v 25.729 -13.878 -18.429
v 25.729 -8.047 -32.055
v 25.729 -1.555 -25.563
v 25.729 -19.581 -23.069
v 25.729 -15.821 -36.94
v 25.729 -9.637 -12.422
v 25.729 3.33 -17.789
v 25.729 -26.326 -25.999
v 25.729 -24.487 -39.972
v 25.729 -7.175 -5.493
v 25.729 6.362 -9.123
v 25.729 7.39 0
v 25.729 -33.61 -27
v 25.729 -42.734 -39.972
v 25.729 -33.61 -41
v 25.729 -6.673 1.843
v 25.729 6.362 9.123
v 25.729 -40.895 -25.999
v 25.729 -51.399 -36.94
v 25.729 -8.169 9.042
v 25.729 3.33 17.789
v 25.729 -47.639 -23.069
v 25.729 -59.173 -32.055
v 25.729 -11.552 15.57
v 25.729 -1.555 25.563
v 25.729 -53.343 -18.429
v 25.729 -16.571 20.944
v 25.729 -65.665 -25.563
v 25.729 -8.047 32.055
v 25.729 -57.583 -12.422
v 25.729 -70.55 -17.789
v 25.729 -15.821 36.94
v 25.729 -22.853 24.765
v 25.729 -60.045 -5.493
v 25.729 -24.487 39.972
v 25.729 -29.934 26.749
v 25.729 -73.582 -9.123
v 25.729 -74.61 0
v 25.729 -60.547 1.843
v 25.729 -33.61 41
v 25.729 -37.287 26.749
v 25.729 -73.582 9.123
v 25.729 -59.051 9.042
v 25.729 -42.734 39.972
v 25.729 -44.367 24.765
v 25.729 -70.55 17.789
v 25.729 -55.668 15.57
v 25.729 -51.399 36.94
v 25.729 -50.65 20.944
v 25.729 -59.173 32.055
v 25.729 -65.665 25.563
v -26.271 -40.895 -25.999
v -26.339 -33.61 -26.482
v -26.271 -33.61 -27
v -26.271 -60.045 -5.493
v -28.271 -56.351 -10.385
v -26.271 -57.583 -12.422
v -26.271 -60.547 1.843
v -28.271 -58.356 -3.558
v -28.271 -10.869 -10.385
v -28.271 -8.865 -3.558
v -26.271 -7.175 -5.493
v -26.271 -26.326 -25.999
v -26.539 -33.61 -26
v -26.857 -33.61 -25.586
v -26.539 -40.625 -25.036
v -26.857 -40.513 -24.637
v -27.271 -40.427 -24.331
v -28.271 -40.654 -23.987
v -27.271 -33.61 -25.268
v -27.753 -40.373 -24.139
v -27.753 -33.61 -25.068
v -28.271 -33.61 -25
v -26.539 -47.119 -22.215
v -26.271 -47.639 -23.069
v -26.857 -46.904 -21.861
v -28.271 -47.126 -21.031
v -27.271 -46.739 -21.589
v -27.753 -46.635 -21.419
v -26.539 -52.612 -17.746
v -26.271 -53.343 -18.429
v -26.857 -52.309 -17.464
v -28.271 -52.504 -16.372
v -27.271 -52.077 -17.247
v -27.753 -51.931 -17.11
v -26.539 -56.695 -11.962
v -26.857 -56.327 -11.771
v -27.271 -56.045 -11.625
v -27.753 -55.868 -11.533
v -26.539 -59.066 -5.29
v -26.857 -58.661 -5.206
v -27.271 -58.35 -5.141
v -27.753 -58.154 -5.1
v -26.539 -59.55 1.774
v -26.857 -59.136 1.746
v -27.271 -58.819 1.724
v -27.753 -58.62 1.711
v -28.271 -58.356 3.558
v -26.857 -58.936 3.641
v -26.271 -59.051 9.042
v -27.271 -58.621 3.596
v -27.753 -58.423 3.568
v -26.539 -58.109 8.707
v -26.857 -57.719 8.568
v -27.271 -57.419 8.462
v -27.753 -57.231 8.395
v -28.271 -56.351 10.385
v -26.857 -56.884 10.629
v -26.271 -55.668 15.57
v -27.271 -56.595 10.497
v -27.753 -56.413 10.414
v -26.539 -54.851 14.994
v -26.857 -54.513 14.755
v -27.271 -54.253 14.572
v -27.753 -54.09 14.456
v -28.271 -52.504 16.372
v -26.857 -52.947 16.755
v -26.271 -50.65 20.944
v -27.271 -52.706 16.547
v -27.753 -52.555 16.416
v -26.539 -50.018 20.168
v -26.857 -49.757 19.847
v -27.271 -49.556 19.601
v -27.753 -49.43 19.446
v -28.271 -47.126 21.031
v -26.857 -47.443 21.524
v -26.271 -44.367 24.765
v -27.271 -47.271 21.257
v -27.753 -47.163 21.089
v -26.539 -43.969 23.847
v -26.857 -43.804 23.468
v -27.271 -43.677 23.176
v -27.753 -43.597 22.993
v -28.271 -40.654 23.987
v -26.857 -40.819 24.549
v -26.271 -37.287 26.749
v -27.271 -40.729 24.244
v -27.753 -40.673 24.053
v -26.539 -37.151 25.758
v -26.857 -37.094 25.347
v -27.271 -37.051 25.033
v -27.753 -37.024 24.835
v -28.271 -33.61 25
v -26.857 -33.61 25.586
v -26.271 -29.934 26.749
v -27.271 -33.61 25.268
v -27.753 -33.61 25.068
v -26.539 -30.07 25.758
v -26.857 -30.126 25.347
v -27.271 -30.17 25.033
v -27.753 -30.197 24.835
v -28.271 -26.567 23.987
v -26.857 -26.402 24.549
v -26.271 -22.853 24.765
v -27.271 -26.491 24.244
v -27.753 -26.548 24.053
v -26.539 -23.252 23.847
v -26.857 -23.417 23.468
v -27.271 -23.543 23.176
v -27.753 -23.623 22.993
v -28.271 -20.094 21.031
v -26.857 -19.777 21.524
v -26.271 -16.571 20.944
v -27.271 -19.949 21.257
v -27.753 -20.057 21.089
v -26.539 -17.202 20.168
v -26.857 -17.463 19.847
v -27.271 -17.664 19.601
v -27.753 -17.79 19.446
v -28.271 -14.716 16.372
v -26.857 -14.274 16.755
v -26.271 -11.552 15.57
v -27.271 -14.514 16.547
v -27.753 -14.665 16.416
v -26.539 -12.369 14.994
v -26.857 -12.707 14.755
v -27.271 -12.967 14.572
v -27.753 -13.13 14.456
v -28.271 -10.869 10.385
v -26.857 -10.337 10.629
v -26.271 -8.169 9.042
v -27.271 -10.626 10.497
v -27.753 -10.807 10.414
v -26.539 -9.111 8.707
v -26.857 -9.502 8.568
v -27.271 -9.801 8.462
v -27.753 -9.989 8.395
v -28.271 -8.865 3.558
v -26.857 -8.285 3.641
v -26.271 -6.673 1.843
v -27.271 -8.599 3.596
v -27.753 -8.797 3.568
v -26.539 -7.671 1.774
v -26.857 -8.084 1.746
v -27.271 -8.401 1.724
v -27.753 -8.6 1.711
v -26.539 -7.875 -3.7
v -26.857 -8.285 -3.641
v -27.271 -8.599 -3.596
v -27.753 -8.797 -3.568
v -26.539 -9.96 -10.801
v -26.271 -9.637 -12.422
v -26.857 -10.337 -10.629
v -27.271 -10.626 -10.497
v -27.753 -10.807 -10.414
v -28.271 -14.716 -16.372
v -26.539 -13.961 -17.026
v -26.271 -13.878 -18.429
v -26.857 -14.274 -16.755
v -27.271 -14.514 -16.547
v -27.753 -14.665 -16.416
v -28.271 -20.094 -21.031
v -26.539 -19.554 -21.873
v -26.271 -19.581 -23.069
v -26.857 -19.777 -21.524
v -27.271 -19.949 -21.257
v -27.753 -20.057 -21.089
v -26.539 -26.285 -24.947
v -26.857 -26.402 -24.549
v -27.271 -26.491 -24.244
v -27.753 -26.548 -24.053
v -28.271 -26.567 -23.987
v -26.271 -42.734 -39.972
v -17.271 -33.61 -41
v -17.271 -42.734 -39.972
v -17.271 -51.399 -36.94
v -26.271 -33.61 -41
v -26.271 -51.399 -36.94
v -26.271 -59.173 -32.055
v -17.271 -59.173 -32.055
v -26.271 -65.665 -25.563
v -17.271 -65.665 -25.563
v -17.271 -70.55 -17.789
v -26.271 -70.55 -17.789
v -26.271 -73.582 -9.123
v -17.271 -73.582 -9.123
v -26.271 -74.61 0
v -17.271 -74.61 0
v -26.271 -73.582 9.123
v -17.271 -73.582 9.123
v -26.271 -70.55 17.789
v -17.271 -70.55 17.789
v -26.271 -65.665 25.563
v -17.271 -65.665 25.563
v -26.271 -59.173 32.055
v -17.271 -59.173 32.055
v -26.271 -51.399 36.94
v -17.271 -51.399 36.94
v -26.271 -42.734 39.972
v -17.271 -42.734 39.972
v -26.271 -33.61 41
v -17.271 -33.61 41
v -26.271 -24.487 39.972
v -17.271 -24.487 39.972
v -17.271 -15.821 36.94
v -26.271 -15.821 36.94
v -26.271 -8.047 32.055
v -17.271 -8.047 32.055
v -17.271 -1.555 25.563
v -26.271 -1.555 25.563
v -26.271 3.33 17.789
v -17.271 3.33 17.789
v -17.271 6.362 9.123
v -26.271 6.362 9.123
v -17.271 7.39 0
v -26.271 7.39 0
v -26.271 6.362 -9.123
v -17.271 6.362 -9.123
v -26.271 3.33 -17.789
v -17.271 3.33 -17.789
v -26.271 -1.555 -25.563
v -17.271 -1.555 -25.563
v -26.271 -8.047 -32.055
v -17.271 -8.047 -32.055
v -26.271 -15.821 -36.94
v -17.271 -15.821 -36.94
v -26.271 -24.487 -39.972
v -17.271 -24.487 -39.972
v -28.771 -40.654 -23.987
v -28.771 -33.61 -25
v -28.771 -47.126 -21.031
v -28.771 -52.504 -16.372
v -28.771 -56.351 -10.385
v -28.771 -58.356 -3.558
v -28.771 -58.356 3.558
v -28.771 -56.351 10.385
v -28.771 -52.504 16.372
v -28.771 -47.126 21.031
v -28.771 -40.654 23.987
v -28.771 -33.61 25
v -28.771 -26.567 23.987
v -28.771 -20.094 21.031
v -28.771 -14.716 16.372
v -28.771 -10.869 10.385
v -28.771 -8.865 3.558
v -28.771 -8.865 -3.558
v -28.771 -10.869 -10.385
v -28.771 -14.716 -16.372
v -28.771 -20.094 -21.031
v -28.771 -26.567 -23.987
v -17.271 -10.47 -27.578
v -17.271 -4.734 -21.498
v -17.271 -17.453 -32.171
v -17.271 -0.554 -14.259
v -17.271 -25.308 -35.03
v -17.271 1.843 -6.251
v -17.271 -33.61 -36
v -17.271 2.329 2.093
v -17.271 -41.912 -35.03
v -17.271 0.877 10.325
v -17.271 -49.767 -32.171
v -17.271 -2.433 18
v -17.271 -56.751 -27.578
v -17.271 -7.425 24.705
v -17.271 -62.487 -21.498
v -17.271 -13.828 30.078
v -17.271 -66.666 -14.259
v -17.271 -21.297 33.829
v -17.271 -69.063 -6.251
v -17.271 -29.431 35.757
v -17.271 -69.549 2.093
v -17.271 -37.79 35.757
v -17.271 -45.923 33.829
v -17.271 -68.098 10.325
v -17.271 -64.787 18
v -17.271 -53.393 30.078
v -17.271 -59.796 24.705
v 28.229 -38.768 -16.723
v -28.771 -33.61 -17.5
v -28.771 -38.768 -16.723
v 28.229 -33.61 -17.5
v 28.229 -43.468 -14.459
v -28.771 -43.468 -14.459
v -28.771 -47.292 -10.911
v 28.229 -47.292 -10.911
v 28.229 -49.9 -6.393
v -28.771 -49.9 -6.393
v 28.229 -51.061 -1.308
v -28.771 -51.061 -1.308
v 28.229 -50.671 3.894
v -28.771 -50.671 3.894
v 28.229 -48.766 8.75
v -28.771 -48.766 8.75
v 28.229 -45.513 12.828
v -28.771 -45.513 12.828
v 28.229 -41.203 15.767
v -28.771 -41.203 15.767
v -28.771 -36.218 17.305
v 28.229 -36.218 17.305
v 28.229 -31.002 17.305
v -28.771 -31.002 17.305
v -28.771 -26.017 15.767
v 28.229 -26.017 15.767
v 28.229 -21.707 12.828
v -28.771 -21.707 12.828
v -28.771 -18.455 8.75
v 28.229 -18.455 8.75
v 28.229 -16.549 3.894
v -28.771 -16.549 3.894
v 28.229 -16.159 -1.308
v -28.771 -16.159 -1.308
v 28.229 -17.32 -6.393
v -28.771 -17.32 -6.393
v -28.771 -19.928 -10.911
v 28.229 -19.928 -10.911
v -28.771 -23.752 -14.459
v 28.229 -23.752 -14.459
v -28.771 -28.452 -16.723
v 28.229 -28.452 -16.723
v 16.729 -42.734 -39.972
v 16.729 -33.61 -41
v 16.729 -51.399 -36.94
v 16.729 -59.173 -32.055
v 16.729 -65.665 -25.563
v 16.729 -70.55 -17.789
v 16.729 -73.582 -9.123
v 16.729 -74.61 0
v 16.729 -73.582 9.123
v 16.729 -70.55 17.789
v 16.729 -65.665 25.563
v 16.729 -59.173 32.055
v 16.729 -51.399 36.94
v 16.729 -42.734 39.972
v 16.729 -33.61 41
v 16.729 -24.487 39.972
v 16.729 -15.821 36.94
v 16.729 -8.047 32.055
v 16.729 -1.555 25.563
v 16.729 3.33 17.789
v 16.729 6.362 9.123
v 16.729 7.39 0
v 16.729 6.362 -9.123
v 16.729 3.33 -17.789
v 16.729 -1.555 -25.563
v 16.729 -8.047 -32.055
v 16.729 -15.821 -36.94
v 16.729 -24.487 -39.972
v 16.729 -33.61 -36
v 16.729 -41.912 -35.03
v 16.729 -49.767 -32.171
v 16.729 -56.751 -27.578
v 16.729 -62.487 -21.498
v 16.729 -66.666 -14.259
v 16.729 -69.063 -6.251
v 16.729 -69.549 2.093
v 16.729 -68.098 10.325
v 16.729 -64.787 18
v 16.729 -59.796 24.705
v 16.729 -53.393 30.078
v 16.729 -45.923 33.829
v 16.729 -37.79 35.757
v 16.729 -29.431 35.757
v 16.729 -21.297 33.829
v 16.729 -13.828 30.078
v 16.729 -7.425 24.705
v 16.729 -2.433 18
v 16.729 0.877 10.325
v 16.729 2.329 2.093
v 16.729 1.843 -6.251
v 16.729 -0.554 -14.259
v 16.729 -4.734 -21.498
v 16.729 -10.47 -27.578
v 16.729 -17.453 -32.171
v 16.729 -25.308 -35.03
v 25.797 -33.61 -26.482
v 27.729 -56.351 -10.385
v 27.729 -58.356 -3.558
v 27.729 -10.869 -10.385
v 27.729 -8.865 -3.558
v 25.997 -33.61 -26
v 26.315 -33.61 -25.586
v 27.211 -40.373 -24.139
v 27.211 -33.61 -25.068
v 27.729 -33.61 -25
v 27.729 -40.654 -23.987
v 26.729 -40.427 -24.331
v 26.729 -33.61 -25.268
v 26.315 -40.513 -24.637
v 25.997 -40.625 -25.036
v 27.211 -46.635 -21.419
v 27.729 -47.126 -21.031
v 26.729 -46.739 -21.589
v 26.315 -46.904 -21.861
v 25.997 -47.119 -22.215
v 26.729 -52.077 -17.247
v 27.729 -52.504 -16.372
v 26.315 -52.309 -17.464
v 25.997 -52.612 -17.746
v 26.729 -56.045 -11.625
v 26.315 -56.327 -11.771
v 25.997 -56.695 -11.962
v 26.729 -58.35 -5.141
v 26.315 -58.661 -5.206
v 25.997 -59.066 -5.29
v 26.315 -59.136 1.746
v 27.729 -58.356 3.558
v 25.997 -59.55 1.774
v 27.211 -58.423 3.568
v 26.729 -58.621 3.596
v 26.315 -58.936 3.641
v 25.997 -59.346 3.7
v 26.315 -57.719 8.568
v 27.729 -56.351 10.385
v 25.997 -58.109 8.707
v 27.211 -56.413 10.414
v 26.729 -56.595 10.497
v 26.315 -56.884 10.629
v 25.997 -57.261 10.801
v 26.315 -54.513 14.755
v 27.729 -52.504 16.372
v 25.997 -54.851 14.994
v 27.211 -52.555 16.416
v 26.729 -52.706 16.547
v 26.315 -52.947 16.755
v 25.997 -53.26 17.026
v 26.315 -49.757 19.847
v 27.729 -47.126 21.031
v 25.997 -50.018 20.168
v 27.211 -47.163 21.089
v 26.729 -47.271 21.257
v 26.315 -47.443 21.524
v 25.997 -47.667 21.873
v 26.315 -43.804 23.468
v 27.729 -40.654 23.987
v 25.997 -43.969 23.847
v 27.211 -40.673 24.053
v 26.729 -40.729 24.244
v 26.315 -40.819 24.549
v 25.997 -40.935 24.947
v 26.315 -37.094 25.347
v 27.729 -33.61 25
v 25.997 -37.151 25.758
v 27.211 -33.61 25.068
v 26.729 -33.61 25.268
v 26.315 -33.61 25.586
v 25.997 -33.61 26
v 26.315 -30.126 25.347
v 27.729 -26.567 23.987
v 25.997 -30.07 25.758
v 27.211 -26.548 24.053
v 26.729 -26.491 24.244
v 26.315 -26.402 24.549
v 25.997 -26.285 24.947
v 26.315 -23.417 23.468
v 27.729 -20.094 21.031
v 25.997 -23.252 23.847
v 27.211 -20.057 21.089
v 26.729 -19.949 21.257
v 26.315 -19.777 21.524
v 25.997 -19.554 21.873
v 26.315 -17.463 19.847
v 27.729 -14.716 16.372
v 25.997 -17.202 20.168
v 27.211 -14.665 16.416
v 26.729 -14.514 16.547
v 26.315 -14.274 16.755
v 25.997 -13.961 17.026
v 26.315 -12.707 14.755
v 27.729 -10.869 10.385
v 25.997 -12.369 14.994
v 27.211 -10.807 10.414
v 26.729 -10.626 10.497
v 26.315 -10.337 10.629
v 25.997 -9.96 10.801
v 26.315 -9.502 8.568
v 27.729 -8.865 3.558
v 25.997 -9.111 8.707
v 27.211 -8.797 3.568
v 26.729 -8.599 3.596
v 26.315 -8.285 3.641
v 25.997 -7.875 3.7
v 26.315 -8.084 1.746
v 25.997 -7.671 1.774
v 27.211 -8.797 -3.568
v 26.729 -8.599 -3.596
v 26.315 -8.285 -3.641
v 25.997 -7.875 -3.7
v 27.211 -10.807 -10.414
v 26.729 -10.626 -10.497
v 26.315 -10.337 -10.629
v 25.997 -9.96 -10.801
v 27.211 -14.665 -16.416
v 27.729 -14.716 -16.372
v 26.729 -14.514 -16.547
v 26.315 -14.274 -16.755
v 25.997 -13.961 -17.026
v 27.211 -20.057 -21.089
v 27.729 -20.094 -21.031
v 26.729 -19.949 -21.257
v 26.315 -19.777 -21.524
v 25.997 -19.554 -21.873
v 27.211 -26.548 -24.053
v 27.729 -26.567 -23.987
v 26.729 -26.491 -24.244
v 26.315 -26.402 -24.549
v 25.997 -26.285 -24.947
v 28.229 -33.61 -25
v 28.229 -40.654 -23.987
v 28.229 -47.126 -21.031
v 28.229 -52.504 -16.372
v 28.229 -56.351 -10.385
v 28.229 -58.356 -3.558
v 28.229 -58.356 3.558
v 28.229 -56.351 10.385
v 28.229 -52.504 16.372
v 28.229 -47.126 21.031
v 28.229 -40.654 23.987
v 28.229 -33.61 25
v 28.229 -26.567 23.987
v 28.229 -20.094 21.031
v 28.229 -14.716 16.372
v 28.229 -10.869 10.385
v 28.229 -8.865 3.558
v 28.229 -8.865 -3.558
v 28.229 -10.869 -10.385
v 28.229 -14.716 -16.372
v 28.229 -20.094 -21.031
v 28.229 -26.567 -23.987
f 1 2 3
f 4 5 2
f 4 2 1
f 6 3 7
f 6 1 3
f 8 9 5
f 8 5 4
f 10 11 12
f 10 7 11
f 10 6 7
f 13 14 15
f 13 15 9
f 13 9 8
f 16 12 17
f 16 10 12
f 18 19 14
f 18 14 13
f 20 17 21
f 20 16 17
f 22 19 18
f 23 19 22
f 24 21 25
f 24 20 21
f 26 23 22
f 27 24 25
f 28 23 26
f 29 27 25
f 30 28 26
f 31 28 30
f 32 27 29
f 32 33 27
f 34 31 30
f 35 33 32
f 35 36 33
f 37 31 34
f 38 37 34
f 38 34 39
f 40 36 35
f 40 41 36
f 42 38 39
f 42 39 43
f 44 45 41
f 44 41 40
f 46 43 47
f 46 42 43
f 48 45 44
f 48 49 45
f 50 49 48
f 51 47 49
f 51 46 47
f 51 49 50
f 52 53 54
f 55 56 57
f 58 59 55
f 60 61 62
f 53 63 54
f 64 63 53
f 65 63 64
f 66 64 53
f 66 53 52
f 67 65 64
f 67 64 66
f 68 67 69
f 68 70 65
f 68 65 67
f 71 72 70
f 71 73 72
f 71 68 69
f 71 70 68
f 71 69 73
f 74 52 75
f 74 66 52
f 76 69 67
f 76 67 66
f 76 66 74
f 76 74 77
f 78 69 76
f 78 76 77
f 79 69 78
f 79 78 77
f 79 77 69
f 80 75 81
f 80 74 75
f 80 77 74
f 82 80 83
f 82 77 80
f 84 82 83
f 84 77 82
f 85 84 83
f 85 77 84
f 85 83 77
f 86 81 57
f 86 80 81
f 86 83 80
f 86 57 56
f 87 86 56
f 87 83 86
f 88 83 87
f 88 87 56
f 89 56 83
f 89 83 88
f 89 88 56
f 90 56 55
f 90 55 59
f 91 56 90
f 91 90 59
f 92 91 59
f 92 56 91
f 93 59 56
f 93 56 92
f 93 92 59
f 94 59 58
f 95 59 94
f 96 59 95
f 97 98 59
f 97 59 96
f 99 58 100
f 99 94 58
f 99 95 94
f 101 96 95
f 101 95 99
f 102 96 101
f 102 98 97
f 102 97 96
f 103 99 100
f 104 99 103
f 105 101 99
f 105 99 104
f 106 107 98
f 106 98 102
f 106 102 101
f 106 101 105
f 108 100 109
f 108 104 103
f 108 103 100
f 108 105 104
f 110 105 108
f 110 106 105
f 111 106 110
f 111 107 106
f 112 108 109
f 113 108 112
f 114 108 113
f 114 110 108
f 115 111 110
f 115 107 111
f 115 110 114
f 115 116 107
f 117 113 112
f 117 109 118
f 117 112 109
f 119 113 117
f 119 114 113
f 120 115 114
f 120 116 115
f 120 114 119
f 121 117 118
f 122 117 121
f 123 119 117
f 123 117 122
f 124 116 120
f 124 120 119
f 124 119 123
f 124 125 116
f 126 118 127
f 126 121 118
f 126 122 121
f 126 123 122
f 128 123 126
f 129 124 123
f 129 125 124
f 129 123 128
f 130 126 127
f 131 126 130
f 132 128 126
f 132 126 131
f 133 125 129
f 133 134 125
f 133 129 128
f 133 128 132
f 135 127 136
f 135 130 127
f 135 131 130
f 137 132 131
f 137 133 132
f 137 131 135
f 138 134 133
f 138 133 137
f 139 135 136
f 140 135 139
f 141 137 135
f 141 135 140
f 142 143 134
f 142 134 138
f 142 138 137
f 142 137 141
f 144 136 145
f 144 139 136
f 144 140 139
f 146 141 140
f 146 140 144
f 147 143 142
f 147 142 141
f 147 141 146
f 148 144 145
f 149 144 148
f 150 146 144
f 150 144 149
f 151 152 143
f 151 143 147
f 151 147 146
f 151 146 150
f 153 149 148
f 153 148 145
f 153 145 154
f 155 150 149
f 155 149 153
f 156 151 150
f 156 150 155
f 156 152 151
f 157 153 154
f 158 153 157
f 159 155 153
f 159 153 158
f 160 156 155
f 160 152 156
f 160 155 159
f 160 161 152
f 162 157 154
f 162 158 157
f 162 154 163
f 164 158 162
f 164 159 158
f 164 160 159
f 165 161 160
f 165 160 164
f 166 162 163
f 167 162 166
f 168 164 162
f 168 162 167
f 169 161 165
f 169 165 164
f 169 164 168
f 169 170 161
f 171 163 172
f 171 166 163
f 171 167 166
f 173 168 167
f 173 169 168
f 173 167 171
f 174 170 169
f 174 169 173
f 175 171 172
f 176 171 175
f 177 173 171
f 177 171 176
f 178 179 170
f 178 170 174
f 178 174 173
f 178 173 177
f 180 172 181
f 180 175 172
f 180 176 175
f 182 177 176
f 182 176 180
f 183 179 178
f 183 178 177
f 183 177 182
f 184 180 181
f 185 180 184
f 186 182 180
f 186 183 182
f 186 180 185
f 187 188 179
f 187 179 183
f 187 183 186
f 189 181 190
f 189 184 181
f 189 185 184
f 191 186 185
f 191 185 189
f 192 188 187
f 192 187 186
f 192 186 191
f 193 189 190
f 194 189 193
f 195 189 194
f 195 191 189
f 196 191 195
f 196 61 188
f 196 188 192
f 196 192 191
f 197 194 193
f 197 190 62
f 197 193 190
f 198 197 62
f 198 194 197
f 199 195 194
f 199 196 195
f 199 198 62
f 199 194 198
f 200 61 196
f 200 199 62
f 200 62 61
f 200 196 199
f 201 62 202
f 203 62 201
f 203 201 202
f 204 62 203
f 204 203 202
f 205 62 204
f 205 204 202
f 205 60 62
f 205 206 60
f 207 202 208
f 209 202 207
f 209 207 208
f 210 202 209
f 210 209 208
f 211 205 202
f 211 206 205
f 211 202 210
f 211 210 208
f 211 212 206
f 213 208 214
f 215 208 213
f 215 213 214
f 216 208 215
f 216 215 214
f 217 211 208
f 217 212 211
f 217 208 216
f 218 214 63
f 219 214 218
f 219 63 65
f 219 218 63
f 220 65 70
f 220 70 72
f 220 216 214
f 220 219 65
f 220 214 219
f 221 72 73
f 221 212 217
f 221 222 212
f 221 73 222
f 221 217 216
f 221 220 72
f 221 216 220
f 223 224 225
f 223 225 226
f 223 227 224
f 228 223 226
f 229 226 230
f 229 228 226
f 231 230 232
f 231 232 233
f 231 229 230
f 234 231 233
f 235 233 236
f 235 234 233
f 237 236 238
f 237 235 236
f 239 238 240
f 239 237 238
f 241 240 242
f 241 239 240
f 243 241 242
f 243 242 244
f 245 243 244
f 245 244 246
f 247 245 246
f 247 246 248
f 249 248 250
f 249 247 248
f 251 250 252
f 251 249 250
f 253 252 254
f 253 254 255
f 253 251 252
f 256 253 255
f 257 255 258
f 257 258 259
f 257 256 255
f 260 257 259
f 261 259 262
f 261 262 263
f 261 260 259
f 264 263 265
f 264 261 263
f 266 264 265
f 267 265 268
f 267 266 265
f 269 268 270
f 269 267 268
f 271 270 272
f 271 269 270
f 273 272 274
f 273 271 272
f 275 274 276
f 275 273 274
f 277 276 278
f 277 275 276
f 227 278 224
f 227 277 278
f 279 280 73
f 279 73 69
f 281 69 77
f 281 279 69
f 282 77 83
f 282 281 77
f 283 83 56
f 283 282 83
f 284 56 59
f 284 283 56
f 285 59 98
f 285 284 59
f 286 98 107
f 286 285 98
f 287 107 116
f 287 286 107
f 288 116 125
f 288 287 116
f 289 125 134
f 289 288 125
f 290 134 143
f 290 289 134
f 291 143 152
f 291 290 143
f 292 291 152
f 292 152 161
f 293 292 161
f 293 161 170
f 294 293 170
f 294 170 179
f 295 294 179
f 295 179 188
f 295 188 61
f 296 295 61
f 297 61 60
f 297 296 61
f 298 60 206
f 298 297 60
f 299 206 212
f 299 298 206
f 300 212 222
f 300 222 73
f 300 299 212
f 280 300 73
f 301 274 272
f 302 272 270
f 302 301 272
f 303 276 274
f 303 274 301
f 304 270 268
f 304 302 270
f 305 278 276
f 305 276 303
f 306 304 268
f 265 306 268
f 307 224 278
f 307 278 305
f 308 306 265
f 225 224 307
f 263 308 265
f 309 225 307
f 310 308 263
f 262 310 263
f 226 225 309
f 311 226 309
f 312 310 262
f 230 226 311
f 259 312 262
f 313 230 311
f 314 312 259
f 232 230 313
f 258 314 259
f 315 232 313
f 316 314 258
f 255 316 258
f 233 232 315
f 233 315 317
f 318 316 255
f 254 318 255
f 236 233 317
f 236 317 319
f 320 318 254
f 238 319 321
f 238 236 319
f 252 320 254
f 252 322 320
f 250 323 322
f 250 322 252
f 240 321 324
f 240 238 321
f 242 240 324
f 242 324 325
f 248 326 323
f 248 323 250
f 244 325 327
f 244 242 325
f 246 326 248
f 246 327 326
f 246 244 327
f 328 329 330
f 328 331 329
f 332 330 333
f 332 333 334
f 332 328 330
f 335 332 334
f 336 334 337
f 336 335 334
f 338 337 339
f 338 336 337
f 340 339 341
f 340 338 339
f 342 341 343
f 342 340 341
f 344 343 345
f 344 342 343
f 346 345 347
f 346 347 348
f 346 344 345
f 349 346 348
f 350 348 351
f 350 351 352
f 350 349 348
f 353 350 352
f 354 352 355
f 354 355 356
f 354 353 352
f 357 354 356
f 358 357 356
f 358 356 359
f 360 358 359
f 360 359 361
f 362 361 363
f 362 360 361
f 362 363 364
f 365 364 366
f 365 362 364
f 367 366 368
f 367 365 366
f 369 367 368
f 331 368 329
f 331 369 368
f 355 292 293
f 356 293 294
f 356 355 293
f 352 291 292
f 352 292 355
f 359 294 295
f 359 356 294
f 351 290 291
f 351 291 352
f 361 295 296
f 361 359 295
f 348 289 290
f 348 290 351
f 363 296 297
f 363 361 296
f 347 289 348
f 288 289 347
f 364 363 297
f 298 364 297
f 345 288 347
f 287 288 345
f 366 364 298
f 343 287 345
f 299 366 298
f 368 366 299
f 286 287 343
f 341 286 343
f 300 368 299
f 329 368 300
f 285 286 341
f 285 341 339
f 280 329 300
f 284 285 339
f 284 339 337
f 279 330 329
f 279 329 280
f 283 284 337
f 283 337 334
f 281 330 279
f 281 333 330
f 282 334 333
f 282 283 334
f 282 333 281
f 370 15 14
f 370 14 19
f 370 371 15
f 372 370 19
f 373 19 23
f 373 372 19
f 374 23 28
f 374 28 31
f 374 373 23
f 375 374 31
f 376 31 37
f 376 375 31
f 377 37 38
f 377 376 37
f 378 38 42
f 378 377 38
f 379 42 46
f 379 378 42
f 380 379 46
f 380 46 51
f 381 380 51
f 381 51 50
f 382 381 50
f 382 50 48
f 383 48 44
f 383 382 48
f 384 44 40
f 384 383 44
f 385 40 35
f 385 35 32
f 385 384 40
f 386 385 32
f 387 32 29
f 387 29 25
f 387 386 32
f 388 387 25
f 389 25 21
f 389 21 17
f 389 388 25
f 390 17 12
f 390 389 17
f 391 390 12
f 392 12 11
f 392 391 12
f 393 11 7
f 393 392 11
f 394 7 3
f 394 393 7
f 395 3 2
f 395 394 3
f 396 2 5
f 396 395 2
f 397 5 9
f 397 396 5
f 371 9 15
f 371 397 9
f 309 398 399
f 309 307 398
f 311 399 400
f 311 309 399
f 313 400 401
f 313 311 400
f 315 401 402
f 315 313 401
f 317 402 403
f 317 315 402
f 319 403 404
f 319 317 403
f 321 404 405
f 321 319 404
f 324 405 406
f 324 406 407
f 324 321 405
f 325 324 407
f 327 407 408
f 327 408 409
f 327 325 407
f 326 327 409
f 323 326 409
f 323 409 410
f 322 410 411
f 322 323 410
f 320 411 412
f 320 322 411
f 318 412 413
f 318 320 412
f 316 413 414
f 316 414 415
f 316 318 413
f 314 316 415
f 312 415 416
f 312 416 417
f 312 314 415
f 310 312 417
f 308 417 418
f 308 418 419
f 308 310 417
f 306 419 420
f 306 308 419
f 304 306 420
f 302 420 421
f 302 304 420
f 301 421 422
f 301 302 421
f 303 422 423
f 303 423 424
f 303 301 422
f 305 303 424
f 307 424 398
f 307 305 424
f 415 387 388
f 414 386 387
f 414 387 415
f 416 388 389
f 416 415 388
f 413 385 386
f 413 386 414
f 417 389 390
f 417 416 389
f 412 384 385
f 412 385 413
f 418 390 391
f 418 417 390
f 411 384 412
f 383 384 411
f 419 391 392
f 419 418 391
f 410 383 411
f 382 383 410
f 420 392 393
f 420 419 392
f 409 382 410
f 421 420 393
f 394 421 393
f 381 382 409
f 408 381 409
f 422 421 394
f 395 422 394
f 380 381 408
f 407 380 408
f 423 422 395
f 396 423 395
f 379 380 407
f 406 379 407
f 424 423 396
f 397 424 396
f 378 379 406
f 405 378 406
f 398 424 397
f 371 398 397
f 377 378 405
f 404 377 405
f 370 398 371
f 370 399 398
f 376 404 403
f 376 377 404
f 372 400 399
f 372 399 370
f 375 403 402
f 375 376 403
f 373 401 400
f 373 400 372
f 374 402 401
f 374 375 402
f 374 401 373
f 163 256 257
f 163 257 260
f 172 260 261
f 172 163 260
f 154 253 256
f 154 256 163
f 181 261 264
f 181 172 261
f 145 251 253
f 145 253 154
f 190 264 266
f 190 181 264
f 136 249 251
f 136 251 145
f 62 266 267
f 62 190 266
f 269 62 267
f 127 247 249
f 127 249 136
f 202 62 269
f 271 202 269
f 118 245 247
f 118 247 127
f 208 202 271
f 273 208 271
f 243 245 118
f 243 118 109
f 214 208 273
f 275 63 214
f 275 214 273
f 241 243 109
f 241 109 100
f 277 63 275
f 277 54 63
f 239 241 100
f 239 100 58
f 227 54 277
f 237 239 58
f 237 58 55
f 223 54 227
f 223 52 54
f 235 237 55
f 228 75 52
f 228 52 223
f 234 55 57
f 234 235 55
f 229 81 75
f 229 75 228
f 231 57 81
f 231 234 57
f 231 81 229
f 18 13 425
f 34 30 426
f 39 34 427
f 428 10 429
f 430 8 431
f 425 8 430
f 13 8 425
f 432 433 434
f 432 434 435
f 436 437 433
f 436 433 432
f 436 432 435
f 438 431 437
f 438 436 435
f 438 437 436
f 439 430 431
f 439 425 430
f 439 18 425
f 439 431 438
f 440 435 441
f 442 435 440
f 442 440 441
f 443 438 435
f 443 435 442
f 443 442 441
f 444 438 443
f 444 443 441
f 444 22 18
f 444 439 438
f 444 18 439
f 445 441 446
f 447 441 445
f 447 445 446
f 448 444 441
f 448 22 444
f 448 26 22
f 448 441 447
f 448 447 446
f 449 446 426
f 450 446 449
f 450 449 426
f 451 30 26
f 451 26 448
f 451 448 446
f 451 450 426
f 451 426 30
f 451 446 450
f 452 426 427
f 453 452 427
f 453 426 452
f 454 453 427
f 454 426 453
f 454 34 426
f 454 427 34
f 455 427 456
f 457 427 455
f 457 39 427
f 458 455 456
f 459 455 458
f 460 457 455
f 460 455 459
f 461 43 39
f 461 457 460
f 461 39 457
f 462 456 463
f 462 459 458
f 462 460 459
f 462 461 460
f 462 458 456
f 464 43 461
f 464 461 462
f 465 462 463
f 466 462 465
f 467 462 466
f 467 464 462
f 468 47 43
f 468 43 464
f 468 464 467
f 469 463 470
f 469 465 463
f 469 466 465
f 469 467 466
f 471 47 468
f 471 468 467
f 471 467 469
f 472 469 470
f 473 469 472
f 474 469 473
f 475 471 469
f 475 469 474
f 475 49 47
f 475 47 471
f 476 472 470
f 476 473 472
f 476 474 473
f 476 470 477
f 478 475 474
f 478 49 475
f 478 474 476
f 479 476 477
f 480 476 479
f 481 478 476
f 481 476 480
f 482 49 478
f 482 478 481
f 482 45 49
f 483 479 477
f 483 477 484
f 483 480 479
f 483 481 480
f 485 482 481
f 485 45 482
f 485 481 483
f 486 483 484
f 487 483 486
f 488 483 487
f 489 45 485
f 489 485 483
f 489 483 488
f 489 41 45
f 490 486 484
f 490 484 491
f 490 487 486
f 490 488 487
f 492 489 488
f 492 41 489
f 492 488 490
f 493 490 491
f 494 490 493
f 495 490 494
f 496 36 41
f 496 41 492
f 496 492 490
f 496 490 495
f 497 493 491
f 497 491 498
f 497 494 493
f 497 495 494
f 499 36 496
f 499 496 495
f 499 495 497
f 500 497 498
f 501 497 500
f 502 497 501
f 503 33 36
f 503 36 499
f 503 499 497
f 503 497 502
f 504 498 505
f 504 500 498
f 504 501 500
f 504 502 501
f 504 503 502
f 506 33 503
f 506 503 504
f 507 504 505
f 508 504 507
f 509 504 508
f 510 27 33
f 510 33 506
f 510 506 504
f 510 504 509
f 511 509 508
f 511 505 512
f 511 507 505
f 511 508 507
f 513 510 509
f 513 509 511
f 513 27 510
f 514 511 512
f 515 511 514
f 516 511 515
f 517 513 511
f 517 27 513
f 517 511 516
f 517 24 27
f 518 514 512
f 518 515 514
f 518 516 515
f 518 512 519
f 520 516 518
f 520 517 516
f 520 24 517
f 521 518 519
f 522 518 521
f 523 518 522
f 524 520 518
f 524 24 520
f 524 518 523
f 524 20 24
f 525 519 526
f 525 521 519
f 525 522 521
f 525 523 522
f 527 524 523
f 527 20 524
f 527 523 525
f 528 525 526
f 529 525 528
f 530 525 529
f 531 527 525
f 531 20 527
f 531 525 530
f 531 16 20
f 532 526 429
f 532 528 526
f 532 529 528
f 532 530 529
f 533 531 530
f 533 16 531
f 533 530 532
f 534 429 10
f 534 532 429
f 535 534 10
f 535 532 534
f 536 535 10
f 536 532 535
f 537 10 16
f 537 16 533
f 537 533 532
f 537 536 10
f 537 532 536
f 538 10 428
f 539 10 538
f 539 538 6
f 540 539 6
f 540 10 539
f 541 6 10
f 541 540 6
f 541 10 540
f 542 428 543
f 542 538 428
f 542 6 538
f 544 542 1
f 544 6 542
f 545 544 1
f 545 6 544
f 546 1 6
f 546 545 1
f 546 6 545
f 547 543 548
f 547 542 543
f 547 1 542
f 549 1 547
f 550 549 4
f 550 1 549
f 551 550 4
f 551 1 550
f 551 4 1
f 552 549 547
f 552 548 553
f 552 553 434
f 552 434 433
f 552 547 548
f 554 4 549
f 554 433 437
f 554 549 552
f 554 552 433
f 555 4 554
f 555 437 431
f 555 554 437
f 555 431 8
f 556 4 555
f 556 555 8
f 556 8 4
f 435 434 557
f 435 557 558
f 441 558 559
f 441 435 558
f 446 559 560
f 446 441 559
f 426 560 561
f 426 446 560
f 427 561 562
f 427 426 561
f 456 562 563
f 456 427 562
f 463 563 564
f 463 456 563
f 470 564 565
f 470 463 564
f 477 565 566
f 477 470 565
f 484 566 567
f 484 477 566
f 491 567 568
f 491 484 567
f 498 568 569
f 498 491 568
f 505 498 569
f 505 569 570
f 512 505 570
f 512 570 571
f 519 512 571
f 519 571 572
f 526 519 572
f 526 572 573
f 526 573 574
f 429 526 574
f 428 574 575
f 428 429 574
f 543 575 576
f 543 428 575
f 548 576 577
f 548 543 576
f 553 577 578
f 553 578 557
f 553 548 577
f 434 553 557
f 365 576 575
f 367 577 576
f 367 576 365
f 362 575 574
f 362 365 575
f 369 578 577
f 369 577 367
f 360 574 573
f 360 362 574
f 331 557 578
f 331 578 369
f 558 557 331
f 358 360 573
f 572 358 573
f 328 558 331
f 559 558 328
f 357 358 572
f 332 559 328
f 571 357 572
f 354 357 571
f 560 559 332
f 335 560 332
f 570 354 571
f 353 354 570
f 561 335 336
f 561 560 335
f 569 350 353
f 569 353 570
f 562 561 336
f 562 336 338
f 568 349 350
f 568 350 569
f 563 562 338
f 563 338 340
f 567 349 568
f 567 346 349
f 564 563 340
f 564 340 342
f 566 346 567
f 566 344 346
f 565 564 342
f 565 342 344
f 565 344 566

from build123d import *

# Parameters (mm, degrees)
FILLET1_R = 2


with BuildPart() as part:
    # Sketch1 → Revolve1 (revolve)
    with BuildSketch(Plane.XY, mode=Mode.PRIVATE) as revolve1_sk:
        Polygon((28.229021504, -16.110191686), (28.229021504, -8.610191686), (25.729021504, -8.610191686), (25.729021504, 7.389808314), (16.729021504, 7.389808314), (16.729021504, 2.389808314), (-17.270978496, 2.389808314), (-17.270978496, 7.389808314), (-26.270978496, 7.389808314), (-26.270978496, -8.610191686), (-28.770978496, -8.610191686), (-28.770978496, -16.110191686), align=None)
    revolve(revolve1_sk.sketch.rotate(Axis((27.520922354, -33.610191686, 0), (-1, 0, 0)), 90), axis=Axis((27.520922354, -33.610191686, 0), (-1, 0, 0)))

    # Fillet1
    fillet1_edges = [part.edges().sort_by_distance(p)[0] for p in [
        (-26.270978496, -33.610191686, 25),
        (25.729021504, -33.610191686, 25),
    ]]
    fillet(fillet1_edges, radius=FILLET1_R)


solid = part.part
